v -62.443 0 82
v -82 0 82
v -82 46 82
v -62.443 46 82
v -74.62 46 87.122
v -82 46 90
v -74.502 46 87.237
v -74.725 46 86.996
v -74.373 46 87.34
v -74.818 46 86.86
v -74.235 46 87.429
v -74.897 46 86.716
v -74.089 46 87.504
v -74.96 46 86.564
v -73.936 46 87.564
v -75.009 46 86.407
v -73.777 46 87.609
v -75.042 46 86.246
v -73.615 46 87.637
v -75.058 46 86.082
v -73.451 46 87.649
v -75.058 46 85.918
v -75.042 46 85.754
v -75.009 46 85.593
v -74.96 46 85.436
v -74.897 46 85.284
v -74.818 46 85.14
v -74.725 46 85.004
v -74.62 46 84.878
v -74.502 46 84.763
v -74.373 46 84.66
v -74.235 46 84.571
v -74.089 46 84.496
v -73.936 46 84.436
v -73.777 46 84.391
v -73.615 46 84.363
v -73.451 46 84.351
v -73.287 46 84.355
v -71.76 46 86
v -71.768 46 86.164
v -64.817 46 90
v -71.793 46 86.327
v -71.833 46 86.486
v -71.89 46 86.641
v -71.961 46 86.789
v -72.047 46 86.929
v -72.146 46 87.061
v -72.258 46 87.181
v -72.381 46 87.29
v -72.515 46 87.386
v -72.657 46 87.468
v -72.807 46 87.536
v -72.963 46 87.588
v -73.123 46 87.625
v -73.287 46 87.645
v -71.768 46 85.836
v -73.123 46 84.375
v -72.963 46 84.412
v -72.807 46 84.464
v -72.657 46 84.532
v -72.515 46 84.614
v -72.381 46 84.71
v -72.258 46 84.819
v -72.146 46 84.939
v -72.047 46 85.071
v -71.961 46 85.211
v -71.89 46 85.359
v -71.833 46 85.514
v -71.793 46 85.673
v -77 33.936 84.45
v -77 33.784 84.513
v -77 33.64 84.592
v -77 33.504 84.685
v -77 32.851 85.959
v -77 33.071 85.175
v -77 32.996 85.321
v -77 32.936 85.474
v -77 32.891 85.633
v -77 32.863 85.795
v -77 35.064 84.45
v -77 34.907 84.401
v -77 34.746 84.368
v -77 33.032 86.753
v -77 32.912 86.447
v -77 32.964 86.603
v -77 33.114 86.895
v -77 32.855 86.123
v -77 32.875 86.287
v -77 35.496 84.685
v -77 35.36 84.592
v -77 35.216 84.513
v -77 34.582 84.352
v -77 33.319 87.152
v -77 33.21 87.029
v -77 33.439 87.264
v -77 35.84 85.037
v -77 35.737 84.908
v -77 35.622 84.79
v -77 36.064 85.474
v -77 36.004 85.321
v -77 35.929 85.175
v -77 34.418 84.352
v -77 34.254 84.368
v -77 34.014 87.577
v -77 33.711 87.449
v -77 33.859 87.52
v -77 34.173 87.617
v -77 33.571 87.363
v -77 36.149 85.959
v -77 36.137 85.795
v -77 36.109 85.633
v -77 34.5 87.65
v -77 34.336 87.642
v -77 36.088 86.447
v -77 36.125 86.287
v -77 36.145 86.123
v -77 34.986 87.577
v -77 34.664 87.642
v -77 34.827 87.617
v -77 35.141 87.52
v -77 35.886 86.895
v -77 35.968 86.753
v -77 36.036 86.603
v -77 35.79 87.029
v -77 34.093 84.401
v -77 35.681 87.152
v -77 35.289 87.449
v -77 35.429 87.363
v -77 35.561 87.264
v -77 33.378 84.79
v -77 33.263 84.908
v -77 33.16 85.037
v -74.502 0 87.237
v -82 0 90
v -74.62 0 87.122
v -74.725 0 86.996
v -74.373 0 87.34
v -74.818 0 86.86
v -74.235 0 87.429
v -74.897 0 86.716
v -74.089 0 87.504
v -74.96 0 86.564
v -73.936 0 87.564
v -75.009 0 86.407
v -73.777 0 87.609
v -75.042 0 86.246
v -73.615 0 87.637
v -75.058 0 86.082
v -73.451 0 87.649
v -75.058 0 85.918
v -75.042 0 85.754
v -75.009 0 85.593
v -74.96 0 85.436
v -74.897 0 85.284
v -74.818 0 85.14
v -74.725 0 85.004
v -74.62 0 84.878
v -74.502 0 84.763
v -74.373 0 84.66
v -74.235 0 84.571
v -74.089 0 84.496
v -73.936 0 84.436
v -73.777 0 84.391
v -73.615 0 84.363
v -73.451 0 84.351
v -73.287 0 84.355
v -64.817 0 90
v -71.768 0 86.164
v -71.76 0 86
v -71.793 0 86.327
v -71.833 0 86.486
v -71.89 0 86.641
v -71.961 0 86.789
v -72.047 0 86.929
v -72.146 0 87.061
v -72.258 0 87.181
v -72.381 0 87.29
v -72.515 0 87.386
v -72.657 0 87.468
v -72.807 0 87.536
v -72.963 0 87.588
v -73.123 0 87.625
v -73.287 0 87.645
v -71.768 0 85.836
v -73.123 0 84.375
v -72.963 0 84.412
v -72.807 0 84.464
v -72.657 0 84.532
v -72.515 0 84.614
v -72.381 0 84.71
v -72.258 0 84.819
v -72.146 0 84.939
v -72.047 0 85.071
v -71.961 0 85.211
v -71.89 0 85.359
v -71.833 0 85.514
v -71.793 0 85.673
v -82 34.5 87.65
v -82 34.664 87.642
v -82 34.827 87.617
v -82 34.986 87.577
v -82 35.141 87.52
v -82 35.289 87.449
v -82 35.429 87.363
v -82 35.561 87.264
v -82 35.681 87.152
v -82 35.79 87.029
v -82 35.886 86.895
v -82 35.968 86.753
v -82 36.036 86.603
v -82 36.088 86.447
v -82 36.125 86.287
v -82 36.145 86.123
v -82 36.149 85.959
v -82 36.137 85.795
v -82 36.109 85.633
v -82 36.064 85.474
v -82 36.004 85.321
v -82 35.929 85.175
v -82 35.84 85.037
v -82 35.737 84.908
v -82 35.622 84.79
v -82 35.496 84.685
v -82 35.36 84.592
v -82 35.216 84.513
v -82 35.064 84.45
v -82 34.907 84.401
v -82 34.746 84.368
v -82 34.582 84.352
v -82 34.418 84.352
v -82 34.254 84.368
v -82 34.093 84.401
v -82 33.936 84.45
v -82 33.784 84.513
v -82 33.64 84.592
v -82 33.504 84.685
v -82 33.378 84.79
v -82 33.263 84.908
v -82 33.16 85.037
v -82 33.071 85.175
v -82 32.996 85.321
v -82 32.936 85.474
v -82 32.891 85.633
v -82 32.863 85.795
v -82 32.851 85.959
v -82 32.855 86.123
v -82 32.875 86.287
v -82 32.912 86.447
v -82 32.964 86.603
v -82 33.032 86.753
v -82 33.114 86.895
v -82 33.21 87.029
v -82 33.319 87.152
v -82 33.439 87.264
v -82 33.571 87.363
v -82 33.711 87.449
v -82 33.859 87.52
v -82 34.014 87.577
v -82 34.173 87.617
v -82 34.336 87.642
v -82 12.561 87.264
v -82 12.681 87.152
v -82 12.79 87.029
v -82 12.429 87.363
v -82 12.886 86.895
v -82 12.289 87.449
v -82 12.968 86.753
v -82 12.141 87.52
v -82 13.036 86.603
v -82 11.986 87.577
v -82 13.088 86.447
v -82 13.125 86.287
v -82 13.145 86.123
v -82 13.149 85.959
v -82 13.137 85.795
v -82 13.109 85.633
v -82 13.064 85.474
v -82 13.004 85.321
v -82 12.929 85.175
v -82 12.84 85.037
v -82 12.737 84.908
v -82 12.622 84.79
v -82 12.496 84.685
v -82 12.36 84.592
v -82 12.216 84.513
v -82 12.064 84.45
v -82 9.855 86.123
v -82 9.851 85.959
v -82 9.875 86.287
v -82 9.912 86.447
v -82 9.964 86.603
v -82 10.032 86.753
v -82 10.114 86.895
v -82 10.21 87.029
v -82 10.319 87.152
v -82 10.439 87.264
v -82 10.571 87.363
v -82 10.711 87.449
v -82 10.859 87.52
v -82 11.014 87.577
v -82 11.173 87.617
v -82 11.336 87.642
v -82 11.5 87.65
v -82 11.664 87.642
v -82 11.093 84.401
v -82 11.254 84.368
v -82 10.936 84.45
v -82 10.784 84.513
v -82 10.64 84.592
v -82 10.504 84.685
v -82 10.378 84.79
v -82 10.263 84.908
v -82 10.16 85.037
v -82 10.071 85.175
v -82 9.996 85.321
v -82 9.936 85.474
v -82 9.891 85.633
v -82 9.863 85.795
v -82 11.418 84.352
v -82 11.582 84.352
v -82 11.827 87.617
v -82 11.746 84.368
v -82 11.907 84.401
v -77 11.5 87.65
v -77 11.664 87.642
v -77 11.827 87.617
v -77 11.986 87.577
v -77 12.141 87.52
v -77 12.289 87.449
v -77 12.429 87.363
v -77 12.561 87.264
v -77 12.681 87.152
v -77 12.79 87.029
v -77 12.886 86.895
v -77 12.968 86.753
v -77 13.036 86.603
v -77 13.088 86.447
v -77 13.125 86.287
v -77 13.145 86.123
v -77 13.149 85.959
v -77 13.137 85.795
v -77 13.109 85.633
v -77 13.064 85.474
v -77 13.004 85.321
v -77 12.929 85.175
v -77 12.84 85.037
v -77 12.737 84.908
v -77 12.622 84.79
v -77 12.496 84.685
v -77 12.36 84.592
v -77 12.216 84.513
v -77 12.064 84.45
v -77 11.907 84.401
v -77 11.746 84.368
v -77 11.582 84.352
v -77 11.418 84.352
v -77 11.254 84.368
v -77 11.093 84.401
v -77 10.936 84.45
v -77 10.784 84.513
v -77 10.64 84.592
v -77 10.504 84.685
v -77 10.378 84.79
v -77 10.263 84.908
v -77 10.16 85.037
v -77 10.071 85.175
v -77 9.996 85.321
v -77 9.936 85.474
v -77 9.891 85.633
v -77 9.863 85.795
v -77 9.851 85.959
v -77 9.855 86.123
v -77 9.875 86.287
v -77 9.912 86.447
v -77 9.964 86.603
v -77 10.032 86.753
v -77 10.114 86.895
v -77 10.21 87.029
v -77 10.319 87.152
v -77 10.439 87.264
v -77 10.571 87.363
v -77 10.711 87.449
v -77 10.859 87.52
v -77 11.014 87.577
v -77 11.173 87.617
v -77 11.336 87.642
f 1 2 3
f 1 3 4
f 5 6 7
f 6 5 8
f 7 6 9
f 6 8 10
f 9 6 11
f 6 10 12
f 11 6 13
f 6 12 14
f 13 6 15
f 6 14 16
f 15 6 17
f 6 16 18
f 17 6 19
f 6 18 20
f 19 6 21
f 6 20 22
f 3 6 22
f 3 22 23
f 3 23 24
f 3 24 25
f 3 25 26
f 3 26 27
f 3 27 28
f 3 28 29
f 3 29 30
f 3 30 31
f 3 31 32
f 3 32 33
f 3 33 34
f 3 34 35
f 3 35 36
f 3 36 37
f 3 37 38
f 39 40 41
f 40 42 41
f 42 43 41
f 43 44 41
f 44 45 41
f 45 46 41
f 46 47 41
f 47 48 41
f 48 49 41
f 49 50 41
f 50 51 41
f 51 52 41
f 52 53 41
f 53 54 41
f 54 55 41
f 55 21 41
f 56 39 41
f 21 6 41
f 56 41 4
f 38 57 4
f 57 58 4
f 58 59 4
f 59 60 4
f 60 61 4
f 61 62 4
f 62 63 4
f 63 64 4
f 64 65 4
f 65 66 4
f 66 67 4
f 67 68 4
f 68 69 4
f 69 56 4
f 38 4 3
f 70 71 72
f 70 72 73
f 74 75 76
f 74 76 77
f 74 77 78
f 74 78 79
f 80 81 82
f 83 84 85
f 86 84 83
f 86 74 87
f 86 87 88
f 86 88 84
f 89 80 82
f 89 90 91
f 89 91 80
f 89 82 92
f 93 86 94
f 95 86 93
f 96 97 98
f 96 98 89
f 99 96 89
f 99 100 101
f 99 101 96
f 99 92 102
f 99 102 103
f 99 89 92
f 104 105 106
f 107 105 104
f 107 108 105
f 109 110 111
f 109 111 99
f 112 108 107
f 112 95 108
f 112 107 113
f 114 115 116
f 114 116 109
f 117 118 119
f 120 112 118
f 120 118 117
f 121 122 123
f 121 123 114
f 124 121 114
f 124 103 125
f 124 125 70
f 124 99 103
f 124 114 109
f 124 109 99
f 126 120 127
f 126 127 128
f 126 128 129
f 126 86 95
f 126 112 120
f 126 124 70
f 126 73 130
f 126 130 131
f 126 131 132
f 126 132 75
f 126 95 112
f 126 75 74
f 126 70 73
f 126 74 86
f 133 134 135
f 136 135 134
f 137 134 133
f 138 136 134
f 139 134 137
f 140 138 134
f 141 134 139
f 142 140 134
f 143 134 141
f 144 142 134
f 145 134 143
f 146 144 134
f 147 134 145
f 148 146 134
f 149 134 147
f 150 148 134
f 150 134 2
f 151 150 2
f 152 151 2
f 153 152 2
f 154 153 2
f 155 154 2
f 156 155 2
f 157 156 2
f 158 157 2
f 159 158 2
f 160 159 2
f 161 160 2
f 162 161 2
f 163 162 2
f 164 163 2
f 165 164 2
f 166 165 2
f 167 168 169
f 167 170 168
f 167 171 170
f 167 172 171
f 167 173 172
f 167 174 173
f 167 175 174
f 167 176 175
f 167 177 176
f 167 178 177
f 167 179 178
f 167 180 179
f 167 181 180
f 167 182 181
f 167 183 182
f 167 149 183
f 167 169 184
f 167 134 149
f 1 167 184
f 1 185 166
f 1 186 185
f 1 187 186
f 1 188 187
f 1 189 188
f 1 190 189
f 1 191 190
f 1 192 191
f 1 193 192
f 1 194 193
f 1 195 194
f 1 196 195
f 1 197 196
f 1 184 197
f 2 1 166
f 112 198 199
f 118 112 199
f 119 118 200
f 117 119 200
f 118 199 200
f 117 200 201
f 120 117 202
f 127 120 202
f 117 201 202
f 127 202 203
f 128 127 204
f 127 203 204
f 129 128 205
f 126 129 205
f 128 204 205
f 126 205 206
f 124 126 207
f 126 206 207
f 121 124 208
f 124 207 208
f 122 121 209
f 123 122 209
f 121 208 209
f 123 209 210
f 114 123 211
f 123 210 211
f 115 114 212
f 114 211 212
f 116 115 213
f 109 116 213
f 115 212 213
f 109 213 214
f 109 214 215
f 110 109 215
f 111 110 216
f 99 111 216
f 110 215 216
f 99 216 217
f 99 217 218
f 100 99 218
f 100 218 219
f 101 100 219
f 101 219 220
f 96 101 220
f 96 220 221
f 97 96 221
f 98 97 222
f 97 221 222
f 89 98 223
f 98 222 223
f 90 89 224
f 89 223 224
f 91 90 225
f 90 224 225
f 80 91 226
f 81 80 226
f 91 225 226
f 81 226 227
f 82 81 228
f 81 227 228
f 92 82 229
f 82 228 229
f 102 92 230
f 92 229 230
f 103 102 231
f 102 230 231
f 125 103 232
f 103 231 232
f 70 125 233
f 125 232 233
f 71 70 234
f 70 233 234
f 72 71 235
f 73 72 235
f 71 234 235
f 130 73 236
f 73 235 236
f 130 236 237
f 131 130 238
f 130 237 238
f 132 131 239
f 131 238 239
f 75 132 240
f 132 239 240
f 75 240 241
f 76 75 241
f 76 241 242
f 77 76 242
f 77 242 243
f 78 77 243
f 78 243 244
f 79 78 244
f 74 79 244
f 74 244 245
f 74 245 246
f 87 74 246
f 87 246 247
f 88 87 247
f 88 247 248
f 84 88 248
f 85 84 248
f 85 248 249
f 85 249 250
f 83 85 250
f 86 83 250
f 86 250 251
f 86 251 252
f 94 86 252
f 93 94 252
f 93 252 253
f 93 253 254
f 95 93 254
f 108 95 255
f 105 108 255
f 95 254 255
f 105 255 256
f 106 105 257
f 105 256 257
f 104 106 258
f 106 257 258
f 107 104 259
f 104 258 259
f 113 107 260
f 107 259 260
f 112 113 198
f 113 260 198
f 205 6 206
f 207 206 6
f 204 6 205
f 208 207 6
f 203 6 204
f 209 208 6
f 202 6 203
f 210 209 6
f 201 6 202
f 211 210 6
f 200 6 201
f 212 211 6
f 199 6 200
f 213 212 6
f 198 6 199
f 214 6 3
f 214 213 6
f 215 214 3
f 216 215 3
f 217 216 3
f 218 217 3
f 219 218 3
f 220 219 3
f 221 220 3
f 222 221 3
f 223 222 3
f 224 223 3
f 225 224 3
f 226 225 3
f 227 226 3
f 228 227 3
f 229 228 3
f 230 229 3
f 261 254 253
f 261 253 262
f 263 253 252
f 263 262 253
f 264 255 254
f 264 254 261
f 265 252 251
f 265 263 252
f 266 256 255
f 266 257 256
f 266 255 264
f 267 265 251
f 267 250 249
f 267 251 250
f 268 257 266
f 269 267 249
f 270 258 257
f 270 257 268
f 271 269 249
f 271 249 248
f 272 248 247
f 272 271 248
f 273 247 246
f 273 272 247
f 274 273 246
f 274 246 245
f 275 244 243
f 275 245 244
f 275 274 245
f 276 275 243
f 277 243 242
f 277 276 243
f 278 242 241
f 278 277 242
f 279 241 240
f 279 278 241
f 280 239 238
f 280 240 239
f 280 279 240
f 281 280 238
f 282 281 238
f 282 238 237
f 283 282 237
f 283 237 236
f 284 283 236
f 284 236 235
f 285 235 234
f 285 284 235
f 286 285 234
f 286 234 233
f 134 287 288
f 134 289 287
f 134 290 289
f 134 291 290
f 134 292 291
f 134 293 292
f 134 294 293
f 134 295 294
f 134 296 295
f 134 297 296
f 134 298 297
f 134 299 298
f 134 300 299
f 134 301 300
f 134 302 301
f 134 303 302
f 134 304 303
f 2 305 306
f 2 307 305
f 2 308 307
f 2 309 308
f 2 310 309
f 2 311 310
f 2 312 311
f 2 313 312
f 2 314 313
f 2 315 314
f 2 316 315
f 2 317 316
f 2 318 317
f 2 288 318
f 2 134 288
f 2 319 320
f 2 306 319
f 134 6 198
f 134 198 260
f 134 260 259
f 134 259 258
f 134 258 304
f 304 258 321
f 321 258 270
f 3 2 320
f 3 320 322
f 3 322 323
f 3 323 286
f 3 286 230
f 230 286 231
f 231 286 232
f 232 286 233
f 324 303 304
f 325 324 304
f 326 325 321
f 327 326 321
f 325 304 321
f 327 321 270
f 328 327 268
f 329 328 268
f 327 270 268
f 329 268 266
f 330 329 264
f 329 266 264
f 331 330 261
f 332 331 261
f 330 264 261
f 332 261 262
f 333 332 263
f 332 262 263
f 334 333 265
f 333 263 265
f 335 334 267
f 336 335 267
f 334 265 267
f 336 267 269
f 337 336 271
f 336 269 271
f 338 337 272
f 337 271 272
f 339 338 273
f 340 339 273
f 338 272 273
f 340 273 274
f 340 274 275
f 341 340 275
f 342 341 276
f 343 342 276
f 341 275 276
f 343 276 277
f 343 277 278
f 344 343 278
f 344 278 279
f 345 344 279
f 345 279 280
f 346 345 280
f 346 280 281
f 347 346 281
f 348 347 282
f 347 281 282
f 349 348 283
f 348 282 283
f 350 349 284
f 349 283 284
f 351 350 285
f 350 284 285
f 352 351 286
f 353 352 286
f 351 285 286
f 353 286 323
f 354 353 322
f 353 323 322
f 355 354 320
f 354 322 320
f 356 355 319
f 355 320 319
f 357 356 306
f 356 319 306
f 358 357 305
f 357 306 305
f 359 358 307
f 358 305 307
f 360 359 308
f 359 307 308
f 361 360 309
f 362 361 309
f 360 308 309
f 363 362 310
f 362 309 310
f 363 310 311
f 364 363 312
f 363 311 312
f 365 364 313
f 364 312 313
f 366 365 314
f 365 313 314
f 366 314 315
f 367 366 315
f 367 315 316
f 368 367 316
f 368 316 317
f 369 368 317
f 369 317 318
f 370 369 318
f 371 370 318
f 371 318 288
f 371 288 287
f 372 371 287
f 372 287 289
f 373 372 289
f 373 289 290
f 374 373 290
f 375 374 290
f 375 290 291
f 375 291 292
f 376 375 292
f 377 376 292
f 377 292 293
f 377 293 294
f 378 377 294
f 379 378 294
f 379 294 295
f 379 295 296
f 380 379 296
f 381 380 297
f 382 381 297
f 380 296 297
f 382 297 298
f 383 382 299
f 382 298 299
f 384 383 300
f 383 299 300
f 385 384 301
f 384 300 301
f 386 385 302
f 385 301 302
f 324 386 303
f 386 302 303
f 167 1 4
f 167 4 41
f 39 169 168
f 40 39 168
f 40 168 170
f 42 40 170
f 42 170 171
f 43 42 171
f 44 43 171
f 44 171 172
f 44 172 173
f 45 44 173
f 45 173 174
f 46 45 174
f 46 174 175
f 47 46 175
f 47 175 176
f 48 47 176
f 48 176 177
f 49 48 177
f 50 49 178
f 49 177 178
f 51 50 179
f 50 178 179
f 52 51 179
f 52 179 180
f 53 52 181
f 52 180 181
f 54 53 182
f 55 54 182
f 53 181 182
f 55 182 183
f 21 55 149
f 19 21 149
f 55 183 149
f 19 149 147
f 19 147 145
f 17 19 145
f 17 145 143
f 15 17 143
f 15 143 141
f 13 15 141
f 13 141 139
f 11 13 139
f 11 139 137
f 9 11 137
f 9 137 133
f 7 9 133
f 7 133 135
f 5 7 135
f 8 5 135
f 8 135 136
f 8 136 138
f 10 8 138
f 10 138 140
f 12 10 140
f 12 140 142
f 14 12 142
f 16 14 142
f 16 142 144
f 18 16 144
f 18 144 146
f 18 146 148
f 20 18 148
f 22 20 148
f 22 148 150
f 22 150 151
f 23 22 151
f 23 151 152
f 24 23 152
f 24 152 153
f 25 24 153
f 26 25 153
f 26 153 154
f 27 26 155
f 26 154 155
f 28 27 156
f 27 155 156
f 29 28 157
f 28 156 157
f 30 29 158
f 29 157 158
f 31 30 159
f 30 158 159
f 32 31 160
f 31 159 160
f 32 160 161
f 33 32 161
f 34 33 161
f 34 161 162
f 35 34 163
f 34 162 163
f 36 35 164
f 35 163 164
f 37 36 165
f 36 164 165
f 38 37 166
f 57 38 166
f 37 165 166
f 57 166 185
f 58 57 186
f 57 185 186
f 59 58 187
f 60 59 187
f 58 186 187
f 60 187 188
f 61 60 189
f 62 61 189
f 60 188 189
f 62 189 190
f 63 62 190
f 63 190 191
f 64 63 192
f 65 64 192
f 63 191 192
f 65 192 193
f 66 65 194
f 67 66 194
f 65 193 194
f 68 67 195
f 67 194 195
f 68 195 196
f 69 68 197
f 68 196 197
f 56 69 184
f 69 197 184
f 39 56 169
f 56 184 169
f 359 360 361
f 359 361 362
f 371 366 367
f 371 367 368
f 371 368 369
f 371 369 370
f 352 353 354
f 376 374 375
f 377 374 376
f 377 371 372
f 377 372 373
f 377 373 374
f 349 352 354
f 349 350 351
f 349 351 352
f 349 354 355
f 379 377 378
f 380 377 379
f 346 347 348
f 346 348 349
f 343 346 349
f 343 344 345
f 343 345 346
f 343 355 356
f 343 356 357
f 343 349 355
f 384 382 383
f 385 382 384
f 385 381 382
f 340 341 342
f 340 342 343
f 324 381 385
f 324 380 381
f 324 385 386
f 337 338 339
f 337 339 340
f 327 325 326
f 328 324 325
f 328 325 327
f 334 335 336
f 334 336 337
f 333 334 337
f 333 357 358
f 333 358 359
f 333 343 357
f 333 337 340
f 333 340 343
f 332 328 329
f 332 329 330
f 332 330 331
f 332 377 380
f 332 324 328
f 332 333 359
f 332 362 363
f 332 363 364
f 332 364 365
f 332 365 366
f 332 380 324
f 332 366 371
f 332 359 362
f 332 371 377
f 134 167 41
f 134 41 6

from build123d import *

# Parameters (mm, degrees)
BOSS_EXTRUDE1_DEPTH = 46
CUT_EXTRUDE1_REACH  = 48
SKETCH2_R           = 1.65
SKETCH3_R           = 1.65
CUT_EXTRUDE2_DEPTH  = 5


with BuildPart() as part:
    # Sketch1 → Boss-Extrude1 (new body)
    with BuildSketch(Plane(origin=(-73, 0, 0), x_dir=(0, 0, 1), z_dir=(0, 1, 0))):
        Polygon((82, 10.55666667), (90, 8.18333333), (90, -9), (82, -9), align=None)
    extrude(amount=BOSS_EXTRUDE1_DEPTH)

    # Sketch2 → Cut-Extrude1 (cut, up to next)
    with BuildSketch(Plane.XZ, mode=Mode.PRIVATE) as cut_extrude1_sk1:
        with Locations((-73.41, 86)):
            Circle(SKETCH2_R)
    cut_extrude1_tool1 = extrude(cut_extrude1_sk1.sketch, amount=-CUT_EXTRUDE1_REACH, mode=Mode.PRIVATE) & part.part
    add(cut_extrude1_tool1.solids().sort_by_distance((-73.41, 0, 86))[0], mode=Mode.SUBTRACT)

    # Sketch3 → Cut-Extrude2 (cut)
    with BuildSketch(Plane.ZY.offset(82)):
        with Locations((86, 34.5)):
            Circle(SKETCH3_R)
        with Locations((86, 11.5)):
            Circle(SKETCH3_R)
    extrude(amount=-CUT_EXTRUDE2_DEPTH, mode=Mode.SUBTRACT)


solid = part.part
